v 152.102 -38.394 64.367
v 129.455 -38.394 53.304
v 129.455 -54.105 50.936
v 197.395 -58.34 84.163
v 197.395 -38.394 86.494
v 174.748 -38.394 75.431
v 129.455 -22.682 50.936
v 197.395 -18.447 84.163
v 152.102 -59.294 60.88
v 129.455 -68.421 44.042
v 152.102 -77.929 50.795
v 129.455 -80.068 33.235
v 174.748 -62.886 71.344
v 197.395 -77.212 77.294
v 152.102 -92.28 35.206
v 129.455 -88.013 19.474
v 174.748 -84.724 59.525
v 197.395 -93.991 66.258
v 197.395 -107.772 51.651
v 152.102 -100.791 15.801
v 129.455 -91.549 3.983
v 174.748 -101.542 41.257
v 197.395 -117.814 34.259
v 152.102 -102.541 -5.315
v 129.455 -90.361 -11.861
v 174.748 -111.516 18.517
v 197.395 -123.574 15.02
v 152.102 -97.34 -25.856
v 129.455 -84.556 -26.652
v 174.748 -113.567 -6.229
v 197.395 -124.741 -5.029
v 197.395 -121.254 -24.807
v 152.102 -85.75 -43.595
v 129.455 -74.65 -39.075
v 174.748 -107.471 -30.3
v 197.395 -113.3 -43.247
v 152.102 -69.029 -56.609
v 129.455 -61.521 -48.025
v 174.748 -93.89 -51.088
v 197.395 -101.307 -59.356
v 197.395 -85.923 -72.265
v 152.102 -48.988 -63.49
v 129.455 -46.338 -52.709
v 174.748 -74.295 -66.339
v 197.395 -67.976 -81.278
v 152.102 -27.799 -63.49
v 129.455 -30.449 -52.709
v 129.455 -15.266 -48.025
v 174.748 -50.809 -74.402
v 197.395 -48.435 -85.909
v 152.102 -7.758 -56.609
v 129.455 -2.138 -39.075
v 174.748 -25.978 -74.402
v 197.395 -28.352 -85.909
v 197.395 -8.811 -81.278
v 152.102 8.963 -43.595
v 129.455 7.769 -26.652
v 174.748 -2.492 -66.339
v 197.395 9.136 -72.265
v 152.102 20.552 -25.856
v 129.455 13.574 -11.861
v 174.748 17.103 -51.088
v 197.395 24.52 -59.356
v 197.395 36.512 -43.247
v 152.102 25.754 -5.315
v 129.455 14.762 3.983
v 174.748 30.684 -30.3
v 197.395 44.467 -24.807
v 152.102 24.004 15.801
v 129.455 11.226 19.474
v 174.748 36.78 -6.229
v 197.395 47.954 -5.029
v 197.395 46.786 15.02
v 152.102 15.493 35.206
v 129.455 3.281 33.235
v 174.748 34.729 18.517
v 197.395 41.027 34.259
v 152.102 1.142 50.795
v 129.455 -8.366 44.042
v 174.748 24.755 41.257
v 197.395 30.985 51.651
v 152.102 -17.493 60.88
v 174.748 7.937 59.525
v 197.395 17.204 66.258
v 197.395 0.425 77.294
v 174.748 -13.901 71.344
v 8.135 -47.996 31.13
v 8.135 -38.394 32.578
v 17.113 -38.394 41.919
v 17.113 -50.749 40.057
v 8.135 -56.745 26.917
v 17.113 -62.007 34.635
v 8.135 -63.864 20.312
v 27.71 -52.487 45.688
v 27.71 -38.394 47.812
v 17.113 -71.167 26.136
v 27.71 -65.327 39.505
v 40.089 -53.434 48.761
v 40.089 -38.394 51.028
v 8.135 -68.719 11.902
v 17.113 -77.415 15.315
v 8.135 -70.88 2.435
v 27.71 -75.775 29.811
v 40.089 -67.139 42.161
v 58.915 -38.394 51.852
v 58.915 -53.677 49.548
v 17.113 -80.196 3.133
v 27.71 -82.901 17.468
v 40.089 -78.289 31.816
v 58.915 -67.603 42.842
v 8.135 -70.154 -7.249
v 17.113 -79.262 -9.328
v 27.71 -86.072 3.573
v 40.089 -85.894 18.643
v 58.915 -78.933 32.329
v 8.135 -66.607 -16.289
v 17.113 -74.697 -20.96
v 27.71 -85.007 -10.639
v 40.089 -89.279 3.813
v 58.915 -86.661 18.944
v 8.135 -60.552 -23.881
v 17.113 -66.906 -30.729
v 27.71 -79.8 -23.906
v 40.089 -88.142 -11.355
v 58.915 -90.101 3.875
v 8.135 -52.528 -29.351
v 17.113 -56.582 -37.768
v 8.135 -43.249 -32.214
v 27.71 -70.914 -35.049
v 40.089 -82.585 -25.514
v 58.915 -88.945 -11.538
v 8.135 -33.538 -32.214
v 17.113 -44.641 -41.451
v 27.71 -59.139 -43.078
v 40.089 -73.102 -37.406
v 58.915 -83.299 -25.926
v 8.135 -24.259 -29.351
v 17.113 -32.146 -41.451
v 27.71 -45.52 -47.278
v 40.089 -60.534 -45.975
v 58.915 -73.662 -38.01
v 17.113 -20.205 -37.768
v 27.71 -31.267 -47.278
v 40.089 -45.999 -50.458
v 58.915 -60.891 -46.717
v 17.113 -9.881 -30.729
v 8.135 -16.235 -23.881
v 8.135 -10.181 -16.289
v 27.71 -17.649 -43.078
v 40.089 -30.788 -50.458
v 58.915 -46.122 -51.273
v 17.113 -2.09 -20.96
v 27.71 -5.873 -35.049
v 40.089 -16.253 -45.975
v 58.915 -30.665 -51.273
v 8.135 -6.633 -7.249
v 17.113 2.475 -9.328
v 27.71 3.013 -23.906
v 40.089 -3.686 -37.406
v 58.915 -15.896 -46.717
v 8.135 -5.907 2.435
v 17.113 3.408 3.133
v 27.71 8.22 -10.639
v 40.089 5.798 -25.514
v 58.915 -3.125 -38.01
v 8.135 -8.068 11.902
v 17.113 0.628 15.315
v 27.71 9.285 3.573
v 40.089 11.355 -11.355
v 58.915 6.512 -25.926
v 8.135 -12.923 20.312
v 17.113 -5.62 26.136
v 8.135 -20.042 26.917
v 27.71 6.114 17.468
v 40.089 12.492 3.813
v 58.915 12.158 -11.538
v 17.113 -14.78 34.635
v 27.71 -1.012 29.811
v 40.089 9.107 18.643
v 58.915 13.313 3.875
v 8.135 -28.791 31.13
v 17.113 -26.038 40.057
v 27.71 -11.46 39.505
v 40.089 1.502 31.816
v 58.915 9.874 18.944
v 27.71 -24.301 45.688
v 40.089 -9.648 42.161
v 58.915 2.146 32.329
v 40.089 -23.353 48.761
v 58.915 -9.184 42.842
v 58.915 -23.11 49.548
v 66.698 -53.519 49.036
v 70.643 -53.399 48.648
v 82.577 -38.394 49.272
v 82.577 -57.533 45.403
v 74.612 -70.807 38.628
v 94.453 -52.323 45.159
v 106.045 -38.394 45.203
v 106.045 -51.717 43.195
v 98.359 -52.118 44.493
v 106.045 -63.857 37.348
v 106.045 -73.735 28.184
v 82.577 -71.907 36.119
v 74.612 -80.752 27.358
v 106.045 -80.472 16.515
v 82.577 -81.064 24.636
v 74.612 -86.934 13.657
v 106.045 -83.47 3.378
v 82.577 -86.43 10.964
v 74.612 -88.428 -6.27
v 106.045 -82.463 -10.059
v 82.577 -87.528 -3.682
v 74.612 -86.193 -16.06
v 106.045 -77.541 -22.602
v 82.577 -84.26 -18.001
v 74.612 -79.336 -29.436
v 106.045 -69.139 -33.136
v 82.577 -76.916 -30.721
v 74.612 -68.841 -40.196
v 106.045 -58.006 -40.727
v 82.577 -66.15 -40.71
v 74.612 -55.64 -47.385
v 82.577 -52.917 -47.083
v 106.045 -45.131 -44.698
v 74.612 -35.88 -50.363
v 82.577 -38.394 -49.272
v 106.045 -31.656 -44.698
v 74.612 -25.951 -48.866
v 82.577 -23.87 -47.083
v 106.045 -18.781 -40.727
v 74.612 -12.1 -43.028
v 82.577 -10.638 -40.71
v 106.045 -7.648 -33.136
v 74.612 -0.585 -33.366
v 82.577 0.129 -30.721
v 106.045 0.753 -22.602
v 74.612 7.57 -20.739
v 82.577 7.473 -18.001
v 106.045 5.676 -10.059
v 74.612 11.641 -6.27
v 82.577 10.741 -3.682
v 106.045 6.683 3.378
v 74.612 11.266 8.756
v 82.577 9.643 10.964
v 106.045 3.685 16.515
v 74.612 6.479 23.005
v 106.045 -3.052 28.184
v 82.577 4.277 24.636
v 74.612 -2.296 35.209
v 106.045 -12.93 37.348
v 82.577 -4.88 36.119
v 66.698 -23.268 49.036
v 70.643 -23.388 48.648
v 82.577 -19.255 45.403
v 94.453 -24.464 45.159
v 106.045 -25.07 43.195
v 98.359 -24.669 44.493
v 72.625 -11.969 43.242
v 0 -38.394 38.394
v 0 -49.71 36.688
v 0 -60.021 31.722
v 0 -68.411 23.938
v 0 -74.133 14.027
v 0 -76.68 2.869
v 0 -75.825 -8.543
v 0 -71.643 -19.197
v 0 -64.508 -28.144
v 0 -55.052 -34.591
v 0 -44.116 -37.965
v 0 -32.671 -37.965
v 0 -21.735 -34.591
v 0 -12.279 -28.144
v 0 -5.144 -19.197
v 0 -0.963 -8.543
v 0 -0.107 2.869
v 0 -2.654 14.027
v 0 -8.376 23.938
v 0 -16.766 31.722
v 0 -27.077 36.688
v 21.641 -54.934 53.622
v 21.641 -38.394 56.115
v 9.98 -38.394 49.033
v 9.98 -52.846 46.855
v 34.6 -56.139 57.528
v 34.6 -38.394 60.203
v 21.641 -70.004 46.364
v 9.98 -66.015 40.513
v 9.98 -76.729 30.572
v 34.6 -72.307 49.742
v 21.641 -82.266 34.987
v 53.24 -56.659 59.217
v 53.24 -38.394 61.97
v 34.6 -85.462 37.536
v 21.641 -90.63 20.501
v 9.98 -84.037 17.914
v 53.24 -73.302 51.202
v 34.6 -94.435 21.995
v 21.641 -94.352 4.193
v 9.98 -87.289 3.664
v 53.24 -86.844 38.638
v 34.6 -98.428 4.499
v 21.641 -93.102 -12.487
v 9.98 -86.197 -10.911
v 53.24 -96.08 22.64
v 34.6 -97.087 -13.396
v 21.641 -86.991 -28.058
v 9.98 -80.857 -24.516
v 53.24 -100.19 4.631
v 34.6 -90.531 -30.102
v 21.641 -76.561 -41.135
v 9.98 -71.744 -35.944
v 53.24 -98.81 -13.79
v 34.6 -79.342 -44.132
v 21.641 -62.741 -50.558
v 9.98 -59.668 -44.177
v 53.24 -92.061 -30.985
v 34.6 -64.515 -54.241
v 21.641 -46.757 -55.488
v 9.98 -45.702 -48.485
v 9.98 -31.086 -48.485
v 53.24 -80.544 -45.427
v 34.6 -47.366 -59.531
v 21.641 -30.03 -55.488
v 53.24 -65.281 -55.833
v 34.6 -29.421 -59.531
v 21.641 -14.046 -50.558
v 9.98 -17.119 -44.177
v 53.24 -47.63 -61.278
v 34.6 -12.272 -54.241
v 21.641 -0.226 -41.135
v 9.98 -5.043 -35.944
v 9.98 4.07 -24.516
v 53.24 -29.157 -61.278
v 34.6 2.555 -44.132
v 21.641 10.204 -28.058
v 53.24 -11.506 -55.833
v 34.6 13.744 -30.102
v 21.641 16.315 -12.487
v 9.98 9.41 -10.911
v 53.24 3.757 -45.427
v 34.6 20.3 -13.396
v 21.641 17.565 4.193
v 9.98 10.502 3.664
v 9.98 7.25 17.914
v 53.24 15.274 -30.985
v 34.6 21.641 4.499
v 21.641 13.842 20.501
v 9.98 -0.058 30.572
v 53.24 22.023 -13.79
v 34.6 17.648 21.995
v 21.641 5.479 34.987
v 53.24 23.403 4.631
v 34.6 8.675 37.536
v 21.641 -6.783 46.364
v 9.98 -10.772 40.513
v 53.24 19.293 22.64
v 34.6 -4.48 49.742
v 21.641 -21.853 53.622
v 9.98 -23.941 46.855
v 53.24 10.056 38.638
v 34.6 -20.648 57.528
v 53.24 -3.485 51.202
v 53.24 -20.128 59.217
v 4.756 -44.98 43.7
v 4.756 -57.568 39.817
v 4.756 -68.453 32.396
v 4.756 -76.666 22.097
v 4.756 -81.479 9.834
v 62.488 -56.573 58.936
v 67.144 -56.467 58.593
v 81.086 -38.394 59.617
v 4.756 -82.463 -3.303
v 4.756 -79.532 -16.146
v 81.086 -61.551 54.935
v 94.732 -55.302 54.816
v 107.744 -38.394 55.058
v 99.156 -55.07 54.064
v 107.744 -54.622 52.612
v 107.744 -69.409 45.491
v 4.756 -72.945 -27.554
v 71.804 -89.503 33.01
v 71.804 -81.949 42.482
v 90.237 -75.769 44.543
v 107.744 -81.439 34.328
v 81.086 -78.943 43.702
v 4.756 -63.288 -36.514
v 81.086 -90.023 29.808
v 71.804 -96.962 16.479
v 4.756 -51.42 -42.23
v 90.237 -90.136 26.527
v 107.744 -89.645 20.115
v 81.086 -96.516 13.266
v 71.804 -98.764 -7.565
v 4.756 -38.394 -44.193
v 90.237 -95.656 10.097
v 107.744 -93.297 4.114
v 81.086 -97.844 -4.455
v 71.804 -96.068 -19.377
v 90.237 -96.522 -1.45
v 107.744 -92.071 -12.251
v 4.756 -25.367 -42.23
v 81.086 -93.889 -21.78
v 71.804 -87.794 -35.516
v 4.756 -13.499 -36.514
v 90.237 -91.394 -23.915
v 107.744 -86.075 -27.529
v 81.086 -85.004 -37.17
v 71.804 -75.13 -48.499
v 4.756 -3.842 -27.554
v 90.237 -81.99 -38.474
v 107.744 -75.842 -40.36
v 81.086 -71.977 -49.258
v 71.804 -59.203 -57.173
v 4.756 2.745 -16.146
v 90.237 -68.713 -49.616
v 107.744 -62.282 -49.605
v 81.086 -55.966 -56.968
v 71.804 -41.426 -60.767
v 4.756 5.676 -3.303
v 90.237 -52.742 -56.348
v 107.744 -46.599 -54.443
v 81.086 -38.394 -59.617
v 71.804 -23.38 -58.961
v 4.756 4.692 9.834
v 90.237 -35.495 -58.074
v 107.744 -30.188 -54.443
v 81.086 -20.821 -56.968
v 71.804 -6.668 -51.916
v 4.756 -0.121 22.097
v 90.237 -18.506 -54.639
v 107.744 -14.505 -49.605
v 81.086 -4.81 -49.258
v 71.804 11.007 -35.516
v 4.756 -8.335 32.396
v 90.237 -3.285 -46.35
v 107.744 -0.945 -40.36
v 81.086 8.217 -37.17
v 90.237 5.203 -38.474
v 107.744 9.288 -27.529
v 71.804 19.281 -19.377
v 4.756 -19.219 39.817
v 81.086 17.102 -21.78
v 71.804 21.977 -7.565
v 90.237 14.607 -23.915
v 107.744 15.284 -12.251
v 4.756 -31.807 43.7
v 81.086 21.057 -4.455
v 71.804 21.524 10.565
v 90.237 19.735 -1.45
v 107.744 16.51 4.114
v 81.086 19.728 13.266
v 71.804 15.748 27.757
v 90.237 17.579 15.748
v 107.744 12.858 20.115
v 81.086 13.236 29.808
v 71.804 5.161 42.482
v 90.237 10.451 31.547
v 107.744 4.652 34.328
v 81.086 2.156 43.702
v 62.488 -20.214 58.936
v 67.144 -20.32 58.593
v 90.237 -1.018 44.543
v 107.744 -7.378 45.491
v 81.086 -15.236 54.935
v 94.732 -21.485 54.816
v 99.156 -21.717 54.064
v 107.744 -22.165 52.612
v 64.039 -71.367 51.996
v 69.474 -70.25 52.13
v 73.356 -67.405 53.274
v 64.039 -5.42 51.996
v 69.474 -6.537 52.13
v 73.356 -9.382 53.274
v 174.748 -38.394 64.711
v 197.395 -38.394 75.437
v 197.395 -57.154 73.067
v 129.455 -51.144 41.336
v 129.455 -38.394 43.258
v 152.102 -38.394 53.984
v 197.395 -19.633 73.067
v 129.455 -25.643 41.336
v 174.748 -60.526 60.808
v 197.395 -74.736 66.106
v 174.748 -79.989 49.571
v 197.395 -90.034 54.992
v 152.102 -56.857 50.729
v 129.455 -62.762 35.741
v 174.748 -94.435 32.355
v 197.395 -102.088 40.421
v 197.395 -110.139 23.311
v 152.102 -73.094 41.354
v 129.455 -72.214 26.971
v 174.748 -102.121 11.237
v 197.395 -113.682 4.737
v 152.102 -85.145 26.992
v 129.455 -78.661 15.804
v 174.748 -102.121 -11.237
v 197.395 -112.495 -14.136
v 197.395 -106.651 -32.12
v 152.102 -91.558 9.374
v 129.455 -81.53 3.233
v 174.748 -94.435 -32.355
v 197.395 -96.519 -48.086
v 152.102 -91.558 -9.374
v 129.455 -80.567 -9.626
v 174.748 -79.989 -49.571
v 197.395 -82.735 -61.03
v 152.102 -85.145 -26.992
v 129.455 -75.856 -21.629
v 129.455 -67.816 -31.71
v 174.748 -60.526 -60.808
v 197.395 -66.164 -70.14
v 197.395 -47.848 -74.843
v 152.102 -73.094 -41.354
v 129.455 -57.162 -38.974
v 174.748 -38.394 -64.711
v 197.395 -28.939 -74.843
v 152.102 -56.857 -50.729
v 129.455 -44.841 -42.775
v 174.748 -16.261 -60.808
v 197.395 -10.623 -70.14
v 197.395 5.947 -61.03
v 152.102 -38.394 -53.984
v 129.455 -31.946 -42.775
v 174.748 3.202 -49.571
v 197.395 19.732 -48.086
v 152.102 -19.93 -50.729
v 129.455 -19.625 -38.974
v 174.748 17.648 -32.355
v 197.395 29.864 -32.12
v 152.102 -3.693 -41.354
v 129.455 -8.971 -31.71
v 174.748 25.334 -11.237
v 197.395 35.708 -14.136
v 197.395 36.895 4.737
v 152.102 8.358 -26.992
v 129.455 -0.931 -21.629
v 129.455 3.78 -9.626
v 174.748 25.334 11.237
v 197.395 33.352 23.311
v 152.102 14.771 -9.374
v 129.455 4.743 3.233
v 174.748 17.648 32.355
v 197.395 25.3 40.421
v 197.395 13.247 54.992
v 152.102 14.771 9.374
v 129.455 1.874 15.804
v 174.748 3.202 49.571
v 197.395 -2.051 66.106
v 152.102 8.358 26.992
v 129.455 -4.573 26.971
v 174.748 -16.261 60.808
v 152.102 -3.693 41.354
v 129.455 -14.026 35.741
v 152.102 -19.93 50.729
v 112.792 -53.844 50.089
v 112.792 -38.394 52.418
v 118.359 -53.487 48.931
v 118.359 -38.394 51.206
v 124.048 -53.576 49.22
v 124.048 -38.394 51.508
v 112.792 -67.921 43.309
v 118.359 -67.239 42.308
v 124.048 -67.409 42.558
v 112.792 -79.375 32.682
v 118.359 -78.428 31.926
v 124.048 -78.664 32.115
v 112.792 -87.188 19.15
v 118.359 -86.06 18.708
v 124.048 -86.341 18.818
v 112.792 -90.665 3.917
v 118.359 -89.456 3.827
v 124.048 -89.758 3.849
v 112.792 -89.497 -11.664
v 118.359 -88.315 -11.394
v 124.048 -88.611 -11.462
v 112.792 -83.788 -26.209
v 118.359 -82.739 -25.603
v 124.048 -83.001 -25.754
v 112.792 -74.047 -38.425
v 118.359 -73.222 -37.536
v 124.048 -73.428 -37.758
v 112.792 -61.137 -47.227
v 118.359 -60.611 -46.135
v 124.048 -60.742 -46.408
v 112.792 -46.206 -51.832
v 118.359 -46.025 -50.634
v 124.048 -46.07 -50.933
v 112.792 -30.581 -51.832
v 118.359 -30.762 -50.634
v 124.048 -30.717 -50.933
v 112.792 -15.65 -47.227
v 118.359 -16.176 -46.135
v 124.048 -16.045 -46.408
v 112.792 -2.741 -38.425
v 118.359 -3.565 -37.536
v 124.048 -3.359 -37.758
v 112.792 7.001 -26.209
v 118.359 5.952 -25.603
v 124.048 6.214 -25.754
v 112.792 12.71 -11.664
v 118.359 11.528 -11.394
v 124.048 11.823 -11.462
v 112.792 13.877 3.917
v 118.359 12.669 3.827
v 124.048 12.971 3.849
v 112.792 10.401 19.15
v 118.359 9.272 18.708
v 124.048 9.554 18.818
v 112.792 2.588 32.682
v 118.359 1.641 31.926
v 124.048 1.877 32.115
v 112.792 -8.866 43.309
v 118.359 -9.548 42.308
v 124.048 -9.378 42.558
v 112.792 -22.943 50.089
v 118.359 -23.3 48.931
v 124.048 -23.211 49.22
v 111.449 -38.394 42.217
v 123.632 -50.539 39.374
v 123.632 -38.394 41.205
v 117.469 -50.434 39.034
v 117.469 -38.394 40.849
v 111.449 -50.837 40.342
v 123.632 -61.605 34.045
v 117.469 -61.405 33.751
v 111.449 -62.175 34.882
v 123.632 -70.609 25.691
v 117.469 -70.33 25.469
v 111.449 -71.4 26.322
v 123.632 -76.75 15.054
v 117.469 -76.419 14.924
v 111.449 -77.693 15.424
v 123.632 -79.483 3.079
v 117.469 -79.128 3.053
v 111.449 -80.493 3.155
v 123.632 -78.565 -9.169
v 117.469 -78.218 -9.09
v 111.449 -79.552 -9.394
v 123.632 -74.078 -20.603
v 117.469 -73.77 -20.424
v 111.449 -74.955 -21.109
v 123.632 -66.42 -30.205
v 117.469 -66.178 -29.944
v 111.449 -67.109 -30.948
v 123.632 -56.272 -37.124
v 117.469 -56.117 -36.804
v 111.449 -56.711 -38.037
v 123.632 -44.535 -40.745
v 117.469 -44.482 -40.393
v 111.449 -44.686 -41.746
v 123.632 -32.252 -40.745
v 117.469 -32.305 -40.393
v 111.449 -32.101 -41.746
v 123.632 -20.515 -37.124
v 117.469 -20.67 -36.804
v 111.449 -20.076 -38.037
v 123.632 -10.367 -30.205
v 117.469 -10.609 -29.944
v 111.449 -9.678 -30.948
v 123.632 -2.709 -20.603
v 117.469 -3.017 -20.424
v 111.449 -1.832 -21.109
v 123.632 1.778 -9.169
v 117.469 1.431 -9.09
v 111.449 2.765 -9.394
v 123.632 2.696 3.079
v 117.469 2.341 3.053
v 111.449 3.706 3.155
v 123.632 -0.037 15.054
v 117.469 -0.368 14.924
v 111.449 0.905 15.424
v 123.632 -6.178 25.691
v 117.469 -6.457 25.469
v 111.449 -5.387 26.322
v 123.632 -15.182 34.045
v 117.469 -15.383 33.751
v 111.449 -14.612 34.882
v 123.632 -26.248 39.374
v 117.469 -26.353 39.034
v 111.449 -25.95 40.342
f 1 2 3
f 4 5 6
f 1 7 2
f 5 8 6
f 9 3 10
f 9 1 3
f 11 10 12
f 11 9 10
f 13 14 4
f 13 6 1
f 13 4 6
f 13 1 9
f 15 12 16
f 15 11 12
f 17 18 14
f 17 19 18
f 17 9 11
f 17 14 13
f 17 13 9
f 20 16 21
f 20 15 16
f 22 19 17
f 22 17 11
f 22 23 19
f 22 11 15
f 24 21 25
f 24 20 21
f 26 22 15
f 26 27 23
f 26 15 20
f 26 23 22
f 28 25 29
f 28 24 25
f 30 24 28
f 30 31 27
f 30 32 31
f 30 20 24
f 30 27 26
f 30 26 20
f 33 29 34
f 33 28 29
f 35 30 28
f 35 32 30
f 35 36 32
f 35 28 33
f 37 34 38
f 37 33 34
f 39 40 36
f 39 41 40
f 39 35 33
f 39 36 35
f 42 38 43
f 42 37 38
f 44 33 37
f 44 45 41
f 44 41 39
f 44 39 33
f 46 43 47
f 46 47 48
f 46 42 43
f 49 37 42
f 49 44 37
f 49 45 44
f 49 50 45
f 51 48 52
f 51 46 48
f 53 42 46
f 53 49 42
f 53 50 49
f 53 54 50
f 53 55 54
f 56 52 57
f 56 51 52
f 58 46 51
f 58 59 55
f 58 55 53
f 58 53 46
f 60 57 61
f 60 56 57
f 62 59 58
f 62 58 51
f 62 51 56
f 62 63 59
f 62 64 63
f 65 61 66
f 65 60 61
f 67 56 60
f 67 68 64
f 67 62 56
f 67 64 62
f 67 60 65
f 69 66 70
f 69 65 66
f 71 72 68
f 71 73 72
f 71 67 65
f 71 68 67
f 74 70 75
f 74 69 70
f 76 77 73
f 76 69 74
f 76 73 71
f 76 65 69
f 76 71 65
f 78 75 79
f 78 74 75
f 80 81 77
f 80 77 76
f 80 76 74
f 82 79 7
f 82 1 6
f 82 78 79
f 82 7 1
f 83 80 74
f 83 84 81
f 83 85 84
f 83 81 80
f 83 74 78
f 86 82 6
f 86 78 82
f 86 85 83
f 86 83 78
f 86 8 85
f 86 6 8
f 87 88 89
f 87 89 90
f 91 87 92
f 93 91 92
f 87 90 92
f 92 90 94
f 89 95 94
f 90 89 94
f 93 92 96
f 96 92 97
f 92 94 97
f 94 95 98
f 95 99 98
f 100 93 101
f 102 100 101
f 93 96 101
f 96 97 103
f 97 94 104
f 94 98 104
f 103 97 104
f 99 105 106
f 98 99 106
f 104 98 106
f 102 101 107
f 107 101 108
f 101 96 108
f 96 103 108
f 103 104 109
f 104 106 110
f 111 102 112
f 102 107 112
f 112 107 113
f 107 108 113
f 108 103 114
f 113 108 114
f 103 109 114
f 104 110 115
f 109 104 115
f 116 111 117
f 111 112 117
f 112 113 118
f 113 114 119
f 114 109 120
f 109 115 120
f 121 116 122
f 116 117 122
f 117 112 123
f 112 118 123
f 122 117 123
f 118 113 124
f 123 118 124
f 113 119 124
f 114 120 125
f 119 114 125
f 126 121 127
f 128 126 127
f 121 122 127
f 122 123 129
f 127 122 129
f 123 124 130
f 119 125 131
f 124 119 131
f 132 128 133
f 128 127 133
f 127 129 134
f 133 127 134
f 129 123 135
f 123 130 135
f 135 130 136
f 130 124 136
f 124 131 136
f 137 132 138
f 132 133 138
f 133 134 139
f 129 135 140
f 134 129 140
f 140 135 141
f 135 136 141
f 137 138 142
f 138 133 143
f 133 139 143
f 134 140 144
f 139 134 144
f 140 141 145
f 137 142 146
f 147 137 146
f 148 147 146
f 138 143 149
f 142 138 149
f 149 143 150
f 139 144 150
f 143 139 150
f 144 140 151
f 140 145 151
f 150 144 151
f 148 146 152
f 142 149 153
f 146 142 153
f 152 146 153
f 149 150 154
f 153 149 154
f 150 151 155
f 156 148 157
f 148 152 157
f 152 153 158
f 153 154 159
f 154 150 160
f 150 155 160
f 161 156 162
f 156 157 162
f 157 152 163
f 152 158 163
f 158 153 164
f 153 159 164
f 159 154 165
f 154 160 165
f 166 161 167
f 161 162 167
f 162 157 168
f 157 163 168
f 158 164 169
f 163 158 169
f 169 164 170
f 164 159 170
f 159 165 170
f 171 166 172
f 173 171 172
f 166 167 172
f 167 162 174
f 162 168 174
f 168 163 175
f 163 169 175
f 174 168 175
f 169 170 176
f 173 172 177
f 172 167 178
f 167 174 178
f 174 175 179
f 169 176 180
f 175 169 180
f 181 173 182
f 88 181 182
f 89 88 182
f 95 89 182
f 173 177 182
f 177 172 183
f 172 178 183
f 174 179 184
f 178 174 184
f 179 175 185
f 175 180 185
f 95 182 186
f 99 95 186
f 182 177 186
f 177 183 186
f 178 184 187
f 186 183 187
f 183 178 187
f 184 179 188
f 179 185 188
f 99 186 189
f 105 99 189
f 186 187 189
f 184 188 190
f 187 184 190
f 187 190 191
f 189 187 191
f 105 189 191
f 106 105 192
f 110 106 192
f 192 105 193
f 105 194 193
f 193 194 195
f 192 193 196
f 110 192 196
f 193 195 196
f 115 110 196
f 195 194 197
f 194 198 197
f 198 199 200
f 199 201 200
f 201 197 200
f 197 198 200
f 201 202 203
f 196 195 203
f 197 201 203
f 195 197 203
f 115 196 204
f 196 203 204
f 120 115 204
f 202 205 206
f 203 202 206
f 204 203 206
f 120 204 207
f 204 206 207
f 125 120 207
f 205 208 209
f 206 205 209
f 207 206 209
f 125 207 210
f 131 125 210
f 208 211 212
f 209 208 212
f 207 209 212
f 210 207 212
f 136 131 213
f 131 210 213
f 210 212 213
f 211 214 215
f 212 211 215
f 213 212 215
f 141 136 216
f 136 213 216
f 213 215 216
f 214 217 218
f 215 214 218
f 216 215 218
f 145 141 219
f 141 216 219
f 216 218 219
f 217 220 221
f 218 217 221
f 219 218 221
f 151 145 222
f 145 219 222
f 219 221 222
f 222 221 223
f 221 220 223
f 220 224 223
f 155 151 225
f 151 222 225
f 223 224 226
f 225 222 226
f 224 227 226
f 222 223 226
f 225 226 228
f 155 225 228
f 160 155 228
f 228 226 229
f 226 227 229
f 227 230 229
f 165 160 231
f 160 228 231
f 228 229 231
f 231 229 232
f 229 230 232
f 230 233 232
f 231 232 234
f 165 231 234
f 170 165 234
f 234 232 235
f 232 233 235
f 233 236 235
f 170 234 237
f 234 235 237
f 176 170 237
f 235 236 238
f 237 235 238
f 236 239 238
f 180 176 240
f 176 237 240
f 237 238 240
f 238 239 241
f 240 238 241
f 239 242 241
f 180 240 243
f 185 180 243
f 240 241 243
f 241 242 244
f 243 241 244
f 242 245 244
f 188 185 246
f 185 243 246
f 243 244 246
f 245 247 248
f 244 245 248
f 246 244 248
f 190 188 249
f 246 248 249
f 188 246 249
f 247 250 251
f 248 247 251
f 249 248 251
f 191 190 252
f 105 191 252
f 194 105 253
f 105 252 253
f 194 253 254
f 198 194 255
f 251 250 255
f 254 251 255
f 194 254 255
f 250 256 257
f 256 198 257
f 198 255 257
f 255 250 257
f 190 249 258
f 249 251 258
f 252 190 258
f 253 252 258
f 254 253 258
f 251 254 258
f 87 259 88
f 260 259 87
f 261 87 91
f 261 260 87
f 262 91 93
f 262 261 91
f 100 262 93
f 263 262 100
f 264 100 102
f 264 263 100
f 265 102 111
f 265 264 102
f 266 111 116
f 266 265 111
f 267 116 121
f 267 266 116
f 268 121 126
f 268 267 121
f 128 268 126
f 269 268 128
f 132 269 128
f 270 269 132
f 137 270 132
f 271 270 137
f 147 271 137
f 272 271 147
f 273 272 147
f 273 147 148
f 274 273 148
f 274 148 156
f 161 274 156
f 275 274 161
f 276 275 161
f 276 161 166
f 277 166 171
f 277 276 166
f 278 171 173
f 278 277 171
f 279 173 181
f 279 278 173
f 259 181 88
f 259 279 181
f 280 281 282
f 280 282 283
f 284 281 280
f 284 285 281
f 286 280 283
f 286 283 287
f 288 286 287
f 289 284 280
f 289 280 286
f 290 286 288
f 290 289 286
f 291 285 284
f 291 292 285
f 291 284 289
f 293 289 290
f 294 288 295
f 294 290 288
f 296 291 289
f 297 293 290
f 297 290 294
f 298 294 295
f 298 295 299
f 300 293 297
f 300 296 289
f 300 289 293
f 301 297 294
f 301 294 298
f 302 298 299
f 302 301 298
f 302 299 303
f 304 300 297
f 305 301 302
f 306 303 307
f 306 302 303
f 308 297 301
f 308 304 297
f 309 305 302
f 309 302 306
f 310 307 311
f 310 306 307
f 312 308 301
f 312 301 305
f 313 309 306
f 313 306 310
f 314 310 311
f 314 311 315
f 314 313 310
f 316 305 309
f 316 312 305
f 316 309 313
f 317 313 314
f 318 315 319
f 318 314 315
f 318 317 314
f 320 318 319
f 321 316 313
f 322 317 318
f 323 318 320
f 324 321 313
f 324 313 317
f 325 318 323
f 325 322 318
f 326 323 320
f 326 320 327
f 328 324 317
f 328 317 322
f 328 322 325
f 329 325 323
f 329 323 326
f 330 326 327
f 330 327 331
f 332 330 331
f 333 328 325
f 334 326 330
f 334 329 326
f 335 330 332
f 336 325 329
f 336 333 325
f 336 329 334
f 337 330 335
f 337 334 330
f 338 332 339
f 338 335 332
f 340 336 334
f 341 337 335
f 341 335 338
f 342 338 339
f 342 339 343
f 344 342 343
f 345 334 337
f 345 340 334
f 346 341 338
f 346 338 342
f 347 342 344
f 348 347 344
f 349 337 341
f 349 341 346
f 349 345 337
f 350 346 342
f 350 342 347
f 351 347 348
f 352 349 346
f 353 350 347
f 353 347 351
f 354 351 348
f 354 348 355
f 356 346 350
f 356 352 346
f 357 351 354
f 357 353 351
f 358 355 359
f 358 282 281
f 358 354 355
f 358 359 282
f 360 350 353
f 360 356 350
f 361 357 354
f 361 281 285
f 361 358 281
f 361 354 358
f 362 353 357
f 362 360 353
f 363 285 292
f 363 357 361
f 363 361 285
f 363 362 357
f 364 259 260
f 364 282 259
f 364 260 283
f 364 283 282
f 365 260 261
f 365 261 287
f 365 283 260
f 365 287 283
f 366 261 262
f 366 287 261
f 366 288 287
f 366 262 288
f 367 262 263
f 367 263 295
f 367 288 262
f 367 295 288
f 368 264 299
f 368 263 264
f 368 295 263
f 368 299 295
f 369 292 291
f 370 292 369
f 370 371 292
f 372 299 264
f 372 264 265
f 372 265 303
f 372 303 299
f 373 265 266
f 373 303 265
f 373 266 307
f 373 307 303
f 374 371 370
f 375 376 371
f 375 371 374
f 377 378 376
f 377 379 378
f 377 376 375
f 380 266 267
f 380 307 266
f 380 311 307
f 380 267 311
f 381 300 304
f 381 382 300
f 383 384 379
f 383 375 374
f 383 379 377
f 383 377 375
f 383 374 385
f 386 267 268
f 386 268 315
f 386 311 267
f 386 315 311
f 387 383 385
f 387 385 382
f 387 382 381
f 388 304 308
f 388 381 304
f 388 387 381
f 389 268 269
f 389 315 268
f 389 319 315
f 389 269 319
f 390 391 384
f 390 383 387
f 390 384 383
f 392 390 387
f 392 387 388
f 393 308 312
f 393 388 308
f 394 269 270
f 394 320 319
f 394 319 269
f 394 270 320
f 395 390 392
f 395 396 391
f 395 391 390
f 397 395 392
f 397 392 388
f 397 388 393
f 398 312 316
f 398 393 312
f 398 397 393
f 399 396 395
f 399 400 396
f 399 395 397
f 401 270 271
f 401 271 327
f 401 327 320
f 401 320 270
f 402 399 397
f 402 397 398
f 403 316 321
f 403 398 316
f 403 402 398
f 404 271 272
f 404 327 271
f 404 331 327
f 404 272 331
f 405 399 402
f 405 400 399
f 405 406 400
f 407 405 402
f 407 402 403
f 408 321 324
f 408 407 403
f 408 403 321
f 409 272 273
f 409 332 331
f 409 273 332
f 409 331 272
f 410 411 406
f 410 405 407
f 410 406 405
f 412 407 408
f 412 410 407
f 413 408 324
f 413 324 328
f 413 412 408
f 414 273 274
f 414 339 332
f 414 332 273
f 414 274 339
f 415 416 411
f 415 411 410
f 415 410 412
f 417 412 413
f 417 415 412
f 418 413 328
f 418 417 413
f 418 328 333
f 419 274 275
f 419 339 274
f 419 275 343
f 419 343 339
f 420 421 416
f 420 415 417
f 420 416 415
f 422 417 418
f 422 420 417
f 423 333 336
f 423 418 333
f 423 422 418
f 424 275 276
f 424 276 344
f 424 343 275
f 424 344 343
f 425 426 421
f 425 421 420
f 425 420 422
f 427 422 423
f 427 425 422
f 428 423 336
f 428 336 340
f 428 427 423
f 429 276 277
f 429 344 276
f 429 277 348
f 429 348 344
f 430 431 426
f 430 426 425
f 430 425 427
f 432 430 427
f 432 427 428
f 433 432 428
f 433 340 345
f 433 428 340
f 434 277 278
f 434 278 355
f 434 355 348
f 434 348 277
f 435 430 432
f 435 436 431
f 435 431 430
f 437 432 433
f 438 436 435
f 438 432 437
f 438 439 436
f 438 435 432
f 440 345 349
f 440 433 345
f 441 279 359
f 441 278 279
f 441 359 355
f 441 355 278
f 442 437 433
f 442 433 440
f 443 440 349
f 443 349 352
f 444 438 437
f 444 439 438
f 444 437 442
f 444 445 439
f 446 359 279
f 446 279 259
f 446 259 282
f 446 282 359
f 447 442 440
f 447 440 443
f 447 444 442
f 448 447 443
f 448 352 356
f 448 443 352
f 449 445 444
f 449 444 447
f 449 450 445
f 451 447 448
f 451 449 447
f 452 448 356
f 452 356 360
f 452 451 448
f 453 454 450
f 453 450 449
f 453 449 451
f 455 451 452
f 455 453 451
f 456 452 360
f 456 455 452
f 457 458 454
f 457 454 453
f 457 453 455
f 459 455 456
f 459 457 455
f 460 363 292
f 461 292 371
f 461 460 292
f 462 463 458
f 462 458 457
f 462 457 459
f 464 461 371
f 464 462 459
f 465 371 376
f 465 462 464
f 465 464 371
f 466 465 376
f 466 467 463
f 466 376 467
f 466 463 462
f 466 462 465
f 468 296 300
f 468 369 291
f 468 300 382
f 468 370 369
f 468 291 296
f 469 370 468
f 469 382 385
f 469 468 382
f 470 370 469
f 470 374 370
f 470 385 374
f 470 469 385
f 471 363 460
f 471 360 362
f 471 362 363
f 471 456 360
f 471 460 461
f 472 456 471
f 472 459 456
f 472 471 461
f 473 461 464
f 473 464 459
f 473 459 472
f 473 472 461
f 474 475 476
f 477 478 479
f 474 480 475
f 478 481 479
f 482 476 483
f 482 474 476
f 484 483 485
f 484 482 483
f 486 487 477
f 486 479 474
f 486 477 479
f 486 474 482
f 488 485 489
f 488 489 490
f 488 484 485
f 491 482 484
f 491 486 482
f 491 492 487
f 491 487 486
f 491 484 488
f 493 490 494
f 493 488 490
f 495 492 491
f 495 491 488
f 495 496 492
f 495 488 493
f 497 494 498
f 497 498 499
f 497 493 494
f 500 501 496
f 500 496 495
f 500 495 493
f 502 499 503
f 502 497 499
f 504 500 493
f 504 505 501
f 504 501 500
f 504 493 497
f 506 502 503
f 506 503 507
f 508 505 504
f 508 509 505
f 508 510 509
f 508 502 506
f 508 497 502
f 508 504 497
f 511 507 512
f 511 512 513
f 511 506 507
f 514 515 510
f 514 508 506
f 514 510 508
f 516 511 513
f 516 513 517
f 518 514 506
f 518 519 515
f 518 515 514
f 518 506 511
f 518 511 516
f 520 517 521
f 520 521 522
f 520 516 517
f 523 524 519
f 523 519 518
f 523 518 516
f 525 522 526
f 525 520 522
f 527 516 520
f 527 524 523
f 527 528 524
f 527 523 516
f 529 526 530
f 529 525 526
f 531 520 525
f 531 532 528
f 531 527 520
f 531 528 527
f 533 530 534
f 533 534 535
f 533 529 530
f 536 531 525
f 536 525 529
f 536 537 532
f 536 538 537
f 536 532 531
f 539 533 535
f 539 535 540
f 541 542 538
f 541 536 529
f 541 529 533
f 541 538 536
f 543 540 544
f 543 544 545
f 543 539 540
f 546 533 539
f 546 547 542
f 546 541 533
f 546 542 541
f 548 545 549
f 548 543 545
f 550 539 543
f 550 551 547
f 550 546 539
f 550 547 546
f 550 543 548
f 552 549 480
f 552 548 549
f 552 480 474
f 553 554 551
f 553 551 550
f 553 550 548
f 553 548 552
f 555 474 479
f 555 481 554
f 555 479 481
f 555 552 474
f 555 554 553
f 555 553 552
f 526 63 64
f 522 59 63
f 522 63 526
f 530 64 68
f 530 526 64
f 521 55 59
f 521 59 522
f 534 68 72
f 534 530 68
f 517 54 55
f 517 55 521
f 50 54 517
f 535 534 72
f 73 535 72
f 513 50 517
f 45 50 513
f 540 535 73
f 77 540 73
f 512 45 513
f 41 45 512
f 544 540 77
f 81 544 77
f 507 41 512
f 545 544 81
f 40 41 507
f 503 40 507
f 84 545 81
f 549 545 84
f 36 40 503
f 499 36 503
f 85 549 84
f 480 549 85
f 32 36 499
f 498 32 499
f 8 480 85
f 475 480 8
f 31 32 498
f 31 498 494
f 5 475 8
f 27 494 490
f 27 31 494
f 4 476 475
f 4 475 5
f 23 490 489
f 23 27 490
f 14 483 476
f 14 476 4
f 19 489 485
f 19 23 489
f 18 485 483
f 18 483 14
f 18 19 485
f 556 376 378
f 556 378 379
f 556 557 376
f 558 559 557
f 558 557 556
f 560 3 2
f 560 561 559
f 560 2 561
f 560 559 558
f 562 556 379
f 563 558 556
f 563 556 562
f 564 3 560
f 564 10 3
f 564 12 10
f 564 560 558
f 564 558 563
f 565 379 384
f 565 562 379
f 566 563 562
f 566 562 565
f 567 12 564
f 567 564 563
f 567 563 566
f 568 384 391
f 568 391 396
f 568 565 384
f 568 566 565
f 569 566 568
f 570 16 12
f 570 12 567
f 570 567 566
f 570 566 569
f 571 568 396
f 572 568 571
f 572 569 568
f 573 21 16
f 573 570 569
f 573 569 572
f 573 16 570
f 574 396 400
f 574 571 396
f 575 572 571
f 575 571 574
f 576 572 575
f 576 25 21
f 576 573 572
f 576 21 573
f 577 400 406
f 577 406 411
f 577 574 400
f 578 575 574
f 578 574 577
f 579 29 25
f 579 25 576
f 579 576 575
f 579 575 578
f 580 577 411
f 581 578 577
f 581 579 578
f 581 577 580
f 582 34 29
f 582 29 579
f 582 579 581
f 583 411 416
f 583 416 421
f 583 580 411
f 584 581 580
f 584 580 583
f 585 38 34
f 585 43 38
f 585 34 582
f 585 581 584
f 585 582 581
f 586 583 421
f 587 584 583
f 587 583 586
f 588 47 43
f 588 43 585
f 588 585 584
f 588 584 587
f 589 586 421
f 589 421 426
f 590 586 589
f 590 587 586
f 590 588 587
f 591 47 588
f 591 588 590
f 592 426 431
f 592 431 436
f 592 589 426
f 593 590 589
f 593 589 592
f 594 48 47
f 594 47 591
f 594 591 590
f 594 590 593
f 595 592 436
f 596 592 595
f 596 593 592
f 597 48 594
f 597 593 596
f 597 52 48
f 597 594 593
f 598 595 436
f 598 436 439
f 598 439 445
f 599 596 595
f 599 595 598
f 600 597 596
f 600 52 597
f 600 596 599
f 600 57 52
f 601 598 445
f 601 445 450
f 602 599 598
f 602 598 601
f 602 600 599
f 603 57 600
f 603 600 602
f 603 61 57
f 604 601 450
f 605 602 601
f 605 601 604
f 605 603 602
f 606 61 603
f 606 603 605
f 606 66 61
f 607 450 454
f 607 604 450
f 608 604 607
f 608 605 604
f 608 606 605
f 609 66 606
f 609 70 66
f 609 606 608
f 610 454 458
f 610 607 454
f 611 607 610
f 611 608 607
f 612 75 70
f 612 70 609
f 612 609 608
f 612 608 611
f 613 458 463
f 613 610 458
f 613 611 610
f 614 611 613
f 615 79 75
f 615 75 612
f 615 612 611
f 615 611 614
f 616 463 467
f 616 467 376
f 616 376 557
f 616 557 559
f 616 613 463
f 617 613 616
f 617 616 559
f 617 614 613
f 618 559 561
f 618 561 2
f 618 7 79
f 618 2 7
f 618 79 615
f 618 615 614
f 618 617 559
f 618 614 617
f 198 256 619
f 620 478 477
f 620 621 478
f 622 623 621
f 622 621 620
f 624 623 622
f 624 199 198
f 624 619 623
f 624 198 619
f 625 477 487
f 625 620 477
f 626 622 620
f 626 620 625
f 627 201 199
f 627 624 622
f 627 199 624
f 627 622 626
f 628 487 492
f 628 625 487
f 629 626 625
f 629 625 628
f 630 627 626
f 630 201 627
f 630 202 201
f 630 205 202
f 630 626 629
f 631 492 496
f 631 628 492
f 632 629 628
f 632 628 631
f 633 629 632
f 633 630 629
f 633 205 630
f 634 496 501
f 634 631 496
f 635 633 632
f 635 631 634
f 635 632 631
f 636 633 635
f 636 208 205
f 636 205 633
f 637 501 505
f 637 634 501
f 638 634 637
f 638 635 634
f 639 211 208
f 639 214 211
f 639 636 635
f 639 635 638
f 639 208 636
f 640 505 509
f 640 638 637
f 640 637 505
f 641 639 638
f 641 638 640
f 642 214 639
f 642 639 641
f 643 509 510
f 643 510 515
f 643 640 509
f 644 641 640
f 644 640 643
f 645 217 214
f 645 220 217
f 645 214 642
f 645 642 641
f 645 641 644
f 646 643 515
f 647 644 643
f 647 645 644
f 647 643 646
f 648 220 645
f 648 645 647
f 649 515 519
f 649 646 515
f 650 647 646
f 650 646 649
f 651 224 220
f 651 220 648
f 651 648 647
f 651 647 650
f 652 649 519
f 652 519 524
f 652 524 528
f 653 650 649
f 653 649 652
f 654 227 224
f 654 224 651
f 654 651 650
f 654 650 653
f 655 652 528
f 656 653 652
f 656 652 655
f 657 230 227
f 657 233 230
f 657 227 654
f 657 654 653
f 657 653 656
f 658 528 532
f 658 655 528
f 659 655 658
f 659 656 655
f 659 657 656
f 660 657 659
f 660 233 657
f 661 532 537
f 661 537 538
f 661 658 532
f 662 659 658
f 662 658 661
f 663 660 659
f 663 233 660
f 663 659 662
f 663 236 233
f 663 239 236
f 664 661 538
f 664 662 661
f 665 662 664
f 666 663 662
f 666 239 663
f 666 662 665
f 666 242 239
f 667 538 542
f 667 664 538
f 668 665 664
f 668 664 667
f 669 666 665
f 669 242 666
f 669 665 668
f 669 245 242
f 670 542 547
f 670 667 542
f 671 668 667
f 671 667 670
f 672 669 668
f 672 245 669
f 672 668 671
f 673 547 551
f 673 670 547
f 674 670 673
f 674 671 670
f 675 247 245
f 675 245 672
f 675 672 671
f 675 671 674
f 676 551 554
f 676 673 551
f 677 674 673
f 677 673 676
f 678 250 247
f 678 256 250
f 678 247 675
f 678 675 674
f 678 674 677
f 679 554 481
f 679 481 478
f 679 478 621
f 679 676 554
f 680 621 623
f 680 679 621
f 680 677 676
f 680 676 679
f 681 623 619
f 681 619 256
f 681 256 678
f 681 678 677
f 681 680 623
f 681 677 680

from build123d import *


with BuildPart() as part:
    # Sketch1 → Revolve3 (revolve)
    with BuildSketch(Plane.XY, mode=Mode.PRIVATE) as revolve3_sk:
        with BuildLine():
            Line((129.454909333, 14.91059962), (197.394731405, 48.100475176))
            Line((197.394731405, 48.100475176), (197.394731405, 37.04389981))
            Line((197.394731405, 37.04389981), (129.454909333, 4.864278966))
            ThreePointArc((129.454909333, 4.864278966), (117.469016856, 2.455305087), (106.045092047, 6.809465809))
            add(Edge.make_bspline(
                [(8.134718081, -5.816043478), (8.449281823, -5.376073012), (9.098676561, -4.499357309), (10.411576263, -2.848385412), (12.108741528, -0.928077446), (14.224416257, 1.152393571), (17.155918715, 3.656144733), (21.03332082, 6.318333413), (26.059709975, 8.866214455), (31.481907316, 10.829387399), (39.23334831, 12.72128327), (49.833633799, 13.805122547), (63.584543999, 13.386691556), (75.481021534, 11.987405109), (85.025817049, 10.504842911), (92.146299555, 9.28188719), (98.002645597, 8.230555564), (102.628376471, 7.405096976), (104.902483803, 7.006458439), (106.045092047, 6.809465809)],
                knots=[0, 0, 0, 0, 0.015625, 0.03125, 0.0625, 0.09375, 0.125, 0.1875, 0.25, 0.3125, 0.375, 0.5, 0.625, 0.75, 0.8125, 0.875, 0.9375, 0.96875, 1, 1, 1, 1], degree=3))
            Line((8.134718081, -5.816043478), (0, 0))
            add(Edge.make_bspline(
                [(0, 0), (24.538667418, 34.321466527), (72.006948021, 22.825380489), (107.74408758, 16.664079661)],
                knots=[0, 0, 0, 0, 1, 1, 1, 1], degree=3))
            ThreePointArc((107.74408758, 16.664079661), (118.359206539, 12.812150376), (129.454909333, 14.91059962))
        make_face()
    revolve(revolve3_sk.sketch.rotate(Axis((129.454909333, -38.393563347, 0), (1, 0, 0)), 90), axis=Axis((129.454909333, -38.393563347, 0), (1, 0, 0)))


solid = part.part
